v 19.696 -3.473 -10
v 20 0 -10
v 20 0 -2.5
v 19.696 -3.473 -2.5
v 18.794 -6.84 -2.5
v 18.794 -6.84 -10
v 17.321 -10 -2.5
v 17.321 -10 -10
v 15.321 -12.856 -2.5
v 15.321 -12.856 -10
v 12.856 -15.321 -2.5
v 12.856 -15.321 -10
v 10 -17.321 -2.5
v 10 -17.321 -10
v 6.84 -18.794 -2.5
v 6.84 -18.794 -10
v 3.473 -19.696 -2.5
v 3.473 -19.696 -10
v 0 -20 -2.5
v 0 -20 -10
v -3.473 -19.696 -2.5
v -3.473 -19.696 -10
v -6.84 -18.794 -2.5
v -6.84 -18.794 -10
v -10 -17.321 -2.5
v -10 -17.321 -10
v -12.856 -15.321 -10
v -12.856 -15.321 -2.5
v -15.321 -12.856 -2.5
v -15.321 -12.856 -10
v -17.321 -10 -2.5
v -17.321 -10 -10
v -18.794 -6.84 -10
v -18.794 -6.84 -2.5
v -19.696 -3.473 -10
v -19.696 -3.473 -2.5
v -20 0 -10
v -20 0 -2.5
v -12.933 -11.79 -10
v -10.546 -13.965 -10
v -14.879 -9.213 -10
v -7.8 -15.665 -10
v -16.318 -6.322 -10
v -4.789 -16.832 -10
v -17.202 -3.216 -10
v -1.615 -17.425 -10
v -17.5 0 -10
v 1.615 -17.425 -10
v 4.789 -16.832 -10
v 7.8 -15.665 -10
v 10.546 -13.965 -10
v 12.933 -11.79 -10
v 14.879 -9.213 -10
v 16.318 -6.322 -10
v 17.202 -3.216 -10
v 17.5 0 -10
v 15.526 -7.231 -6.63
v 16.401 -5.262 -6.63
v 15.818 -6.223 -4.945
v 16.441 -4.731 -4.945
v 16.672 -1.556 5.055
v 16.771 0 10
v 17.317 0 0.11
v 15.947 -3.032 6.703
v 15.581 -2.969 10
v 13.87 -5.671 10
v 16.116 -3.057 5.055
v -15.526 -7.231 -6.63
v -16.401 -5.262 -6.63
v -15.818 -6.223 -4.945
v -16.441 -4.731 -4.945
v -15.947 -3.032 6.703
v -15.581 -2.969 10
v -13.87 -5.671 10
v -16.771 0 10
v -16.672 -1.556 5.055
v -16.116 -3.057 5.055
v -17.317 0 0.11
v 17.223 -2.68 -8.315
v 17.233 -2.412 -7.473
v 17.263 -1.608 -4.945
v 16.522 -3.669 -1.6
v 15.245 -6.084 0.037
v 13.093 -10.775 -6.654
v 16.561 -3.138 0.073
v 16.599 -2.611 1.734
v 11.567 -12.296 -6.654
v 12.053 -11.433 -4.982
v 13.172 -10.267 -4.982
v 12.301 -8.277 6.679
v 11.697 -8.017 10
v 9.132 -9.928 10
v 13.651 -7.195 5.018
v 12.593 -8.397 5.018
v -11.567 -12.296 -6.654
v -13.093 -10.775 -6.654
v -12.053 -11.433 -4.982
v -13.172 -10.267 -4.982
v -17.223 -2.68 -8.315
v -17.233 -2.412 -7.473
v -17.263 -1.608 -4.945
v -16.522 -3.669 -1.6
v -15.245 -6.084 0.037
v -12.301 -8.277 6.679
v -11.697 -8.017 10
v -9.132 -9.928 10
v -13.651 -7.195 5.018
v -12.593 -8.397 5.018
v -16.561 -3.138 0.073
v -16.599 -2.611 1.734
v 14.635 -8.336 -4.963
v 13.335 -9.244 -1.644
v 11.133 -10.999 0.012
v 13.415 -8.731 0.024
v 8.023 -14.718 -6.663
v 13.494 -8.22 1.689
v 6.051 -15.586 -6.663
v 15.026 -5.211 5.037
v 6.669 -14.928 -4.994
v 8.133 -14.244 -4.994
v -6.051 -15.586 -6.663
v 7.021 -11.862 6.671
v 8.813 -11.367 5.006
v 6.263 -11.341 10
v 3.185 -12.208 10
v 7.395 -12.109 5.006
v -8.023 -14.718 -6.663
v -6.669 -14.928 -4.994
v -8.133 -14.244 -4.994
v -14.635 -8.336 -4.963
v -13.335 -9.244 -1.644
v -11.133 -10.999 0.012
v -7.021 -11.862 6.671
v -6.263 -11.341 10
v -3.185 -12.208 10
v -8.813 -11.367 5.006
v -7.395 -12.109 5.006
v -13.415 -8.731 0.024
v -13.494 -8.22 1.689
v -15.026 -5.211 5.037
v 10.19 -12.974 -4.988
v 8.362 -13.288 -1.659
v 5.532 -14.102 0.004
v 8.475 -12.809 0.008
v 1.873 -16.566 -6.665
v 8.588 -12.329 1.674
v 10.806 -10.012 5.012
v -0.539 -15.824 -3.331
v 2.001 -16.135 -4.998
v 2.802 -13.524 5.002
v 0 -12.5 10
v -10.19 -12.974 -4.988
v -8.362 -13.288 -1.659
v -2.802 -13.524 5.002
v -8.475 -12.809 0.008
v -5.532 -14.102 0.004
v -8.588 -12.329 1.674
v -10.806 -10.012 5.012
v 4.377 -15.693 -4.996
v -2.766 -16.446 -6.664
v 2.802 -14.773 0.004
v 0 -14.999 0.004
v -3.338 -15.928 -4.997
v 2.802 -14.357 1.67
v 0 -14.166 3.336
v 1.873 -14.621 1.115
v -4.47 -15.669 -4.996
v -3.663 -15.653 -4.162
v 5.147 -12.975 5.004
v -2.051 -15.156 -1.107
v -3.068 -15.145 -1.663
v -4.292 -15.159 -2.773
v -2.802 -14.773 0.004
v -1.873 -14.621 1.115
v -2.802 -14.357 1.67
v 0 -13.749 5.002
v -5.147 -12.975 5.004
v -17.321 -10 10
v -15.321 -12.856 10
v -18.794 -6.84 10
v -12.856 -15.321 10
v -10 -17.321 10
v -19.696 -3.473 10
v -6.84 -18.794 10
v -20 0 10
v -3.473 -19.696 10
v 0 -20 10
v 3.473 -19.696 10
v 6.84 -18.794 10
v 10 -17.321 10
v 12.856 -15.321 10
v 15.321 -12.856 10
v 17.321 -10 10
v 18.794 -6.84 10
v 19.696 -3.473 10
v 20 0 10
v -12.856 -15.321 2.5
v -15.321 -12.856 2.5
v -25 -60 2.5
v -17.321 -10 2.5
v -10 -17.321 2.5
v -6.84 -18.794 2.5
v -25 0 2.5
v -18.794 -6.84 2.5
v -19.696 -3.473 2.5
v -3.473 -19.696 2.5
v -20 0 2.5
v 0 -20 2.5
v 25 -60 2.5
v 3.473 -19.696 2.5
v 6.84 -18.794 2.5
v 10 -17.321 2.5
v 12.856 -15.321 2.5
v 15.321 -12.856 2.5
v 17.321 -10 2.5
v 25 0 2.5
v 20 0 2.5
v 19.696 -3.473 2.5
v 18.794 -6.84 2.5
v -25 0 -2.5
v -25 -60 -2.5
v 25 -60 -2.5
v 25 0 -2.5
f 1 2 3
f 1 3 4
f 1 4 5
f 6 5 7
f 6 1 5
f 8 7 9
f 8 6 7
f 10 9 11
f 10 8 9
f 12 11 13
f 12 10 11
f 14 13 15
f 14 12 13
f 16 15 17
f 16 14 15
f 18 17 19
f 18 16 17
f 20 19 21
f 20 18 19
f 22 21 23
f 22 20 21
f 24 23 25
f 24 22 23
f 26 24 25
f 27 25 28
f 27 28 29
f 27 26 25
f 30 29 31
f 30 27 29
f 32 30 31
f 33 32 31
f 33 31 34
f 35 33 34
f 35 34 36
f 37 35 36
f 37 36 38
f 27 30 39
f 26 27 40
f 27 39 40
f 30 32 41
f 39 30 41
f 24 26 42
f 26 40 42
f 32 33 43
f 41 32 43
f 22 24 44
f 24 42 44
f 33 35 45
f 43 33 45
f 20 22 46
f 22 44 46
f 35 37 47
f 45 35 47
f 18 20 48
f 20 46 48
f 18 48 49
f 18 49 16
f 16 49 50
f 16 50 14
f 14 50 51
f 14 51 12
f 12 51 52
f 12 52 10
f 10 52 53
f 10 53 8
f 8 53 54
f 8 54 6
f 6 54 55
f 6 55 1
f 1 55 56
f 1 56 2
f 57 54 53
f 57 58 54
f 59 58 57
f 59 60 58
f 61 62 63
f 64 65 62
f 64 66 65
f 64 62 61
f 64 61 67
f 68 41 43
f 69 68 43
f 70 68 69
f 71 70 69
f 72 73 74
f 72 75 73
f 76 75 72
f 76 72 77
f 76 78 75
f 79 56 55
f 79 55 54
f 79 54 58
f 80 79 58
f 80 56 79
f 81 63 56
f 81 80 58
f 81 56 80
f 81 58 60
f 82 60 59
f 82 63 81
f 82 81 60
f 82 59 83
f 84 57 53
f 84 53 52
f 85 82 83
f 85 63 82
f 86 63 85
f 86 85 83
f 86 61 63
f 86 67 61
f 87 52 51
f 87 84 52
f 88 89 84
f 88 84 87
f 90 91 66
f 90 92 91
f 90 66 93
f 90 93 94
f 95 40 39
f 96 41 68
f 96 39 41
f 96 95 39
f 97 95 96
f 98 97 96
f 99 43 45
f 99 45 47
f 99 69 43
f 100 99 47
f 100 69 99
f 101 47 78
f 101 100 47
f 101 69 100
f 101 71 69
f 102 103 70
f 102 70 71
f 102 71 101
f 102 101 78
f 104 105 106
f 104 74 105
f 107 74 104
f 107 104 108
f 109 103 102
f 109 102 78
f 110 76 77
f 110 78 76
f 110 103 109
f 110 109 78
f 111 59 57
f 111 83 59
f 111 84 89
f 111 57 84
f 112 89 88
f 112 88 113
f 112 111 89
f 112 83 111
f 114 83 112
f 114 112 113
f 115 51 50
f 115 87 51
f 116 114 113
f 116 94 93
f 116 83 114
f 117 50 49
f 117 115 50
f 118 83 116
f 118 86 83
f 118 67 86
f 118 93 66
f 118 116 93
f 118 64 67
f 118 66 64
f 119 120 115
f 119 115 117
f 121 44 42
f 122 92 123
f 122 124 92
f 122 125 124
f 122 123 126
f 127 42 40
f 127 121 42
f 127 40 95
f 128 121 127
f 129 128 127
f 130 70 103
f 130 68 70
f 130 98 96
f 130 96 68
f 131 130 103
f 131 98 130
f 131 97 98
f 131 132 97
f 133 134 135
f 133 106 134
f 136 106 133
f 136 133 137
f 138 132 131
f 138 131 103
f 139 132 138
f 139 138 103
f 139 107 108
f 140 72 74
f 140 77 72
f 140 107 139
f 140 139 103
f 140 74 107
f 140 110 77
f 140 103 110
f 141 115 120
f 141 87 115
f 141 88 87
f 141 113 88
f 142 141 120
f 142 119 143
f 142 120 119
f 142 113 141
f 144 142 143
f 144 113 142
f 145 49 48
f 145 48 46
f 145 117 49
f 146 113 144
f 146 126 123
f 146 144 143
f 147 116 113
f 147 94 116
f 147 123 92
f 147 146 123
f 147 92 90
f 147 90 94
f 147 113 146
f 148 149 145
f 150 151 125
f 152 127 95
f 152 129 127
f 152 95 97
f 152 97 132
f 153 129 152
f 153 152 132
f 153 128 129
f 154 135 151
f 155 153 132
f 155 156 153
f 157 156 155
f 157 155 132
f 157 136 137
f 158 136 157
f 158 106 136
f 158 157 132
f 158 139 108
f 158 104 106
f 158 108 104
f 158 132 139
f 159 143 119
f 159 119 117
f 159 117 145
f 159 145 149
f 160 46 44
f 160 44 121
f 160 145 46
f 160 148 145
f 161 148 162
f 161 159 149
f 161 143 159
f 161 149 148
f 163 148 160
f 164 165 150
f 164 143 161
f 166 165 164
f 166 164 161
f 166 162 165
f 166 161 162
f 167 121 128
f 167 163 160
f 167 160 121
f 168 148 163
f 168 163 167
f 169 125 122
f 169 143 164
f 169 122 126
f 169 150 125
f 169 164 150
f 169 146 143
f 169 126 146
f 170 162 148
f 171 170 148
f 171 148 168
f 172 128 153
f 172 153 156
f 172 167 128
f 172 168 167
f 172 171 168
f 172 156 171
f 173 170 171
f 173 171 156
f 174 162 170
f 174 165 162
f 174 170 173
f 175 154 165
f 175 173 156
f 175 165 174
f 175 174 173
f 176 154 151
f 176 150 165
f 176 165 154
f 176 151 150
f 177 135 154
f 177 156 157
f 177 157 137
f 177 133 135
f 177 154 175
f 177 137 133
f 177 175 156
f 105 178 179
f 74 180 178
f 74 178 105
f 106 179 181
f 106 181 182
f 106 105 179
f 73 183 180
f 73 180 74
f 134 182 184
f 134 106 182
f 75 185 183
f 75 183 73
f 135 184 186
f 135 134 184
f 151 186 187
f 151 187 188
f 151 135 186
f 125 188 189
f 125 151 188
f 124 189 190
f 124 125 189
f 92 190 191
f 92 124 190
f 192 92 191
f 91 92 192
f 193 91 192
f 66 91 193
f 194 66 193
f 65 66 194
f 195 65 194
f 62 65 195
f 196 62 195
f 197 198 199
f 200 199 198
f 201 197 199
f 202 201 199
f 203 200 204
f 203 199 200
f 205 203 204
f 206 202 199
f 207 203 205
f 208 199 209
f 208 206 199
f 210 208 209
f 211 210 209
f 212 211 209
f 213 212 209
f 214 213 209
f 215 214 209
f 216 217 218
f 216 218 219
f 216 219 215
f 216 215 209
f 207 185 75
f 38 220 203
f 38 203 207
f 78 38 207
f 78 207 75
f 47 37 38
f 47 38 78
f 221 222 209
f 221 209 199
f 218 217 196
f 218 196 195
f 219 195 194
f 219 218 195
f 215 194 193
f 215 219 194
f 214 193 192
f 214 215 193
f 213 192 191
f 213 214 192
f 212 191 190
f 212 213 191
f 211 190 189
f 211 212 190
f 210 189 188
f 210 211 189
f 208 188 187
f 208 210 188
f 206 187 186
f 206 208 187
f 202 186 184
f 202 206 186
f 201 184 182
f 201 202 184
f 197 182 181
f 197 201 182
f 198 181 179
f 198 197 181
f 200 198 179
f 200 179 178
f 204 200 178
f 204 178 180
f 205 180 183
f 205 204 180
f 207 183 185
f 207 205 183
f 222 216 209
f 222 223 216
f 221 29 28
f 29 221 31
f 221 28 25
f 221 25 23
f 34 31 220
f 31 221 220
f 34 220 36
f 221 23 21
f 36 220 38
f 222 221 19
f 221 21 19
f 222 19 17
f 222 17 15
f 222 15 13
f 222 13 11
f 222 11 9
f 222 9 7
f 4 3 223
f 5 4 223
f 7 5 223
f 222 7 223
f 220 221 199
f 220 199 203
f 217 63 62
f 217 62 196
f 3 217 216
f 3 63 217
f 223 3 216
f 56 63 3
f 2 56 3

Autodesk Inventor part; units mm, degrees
ref_plane "YZ Plane" through (0, 0, 0) normal (1, 0, 0) x (0, 1, 0)
ref_plane "XZ Plane" through (0, 0, 0) normal (0, 1, 0) x (-1, 0, 0)
ref_plane "XY Plane" through (0, 0, 0) normal (0, 0, 1) x (1, 0, 0)
sketch "草圖1" plane through (0, 0, 0) normal (0, 0, 1) x (1, 0, 0)
  arc A0 (-17.5, 0) -> (17.5, 0) centre (0, 0) ccw
  arc A1 (-20, 0) -> (20, 0) centre (0, 0) ccw
  line L0 (-20, 0) -> (-17.5, 0)
  line L1 (20, 0) -> (17.5, 0)
  line L2 (-35, 0) -> (35, 0) projected
  line L3 (-25, 0) -> (25, 0)
  line L4 (25, -60) -> (-25, -60)
  line L5 (-25, -60) -> (-25, 0)
  line L6 (-25, 0) -> (25, 0)
  line L7 (25, 0) -> (25, -60)
  line L8 (25, -60) -> (-25, 0) construction
  line L9 (-25, -60) -> (25, 0) construction
  line L10 (0, -72) -> (0, 12) projected
  point P0 (17.5, 0)
  point P1 (20, 0)
  point P2 (20, 0)
  point P3 (0, -30)
  dimension "d16" = 50
  dimension "d17" = 60
  dimension "d22" = 40
  dimension "d23" = 17.5
extrude "擠出1" add sketch "草圖1" along normal mid plane 20 contours L2 L10 A0 | A0 L10 A1 L0 | L10 L2 A0 | A0 L1 A1 L10
extrude "擠出2" add sketch "草圖1" along normal mid plane 5
sketch "草圖2" plane through (0, 0, 0) normal (1, 0, 0) x (0, 1, 0)
  line L0 (-10, -10) -> (-5, 10)
  line L1 (0, -2.5) -> (0, -10) projected
  line L2 (0, 10) -> (0, 2.5) projected
  line L3 (-20, -10) -> (0, -10) projected
  line L4 (0, 10) -> (-20, 10) projected
  point P0 (0, 0)
  dimension "d18" = 10
  dimension "d19" = 5
sketch "草圖3" plane through (0, 0, -10) normal (0, 0, -1) x (-1, 0, 0)
  arc A0 (-17.5, 0) -> (17.5, 0) centre (0, 0) ccw projected
  line L0 (25, 0) -> (-25, 0) projected
sweep "掃掠1" cut profiles "草圖3" path "草圖2" path curves L0
